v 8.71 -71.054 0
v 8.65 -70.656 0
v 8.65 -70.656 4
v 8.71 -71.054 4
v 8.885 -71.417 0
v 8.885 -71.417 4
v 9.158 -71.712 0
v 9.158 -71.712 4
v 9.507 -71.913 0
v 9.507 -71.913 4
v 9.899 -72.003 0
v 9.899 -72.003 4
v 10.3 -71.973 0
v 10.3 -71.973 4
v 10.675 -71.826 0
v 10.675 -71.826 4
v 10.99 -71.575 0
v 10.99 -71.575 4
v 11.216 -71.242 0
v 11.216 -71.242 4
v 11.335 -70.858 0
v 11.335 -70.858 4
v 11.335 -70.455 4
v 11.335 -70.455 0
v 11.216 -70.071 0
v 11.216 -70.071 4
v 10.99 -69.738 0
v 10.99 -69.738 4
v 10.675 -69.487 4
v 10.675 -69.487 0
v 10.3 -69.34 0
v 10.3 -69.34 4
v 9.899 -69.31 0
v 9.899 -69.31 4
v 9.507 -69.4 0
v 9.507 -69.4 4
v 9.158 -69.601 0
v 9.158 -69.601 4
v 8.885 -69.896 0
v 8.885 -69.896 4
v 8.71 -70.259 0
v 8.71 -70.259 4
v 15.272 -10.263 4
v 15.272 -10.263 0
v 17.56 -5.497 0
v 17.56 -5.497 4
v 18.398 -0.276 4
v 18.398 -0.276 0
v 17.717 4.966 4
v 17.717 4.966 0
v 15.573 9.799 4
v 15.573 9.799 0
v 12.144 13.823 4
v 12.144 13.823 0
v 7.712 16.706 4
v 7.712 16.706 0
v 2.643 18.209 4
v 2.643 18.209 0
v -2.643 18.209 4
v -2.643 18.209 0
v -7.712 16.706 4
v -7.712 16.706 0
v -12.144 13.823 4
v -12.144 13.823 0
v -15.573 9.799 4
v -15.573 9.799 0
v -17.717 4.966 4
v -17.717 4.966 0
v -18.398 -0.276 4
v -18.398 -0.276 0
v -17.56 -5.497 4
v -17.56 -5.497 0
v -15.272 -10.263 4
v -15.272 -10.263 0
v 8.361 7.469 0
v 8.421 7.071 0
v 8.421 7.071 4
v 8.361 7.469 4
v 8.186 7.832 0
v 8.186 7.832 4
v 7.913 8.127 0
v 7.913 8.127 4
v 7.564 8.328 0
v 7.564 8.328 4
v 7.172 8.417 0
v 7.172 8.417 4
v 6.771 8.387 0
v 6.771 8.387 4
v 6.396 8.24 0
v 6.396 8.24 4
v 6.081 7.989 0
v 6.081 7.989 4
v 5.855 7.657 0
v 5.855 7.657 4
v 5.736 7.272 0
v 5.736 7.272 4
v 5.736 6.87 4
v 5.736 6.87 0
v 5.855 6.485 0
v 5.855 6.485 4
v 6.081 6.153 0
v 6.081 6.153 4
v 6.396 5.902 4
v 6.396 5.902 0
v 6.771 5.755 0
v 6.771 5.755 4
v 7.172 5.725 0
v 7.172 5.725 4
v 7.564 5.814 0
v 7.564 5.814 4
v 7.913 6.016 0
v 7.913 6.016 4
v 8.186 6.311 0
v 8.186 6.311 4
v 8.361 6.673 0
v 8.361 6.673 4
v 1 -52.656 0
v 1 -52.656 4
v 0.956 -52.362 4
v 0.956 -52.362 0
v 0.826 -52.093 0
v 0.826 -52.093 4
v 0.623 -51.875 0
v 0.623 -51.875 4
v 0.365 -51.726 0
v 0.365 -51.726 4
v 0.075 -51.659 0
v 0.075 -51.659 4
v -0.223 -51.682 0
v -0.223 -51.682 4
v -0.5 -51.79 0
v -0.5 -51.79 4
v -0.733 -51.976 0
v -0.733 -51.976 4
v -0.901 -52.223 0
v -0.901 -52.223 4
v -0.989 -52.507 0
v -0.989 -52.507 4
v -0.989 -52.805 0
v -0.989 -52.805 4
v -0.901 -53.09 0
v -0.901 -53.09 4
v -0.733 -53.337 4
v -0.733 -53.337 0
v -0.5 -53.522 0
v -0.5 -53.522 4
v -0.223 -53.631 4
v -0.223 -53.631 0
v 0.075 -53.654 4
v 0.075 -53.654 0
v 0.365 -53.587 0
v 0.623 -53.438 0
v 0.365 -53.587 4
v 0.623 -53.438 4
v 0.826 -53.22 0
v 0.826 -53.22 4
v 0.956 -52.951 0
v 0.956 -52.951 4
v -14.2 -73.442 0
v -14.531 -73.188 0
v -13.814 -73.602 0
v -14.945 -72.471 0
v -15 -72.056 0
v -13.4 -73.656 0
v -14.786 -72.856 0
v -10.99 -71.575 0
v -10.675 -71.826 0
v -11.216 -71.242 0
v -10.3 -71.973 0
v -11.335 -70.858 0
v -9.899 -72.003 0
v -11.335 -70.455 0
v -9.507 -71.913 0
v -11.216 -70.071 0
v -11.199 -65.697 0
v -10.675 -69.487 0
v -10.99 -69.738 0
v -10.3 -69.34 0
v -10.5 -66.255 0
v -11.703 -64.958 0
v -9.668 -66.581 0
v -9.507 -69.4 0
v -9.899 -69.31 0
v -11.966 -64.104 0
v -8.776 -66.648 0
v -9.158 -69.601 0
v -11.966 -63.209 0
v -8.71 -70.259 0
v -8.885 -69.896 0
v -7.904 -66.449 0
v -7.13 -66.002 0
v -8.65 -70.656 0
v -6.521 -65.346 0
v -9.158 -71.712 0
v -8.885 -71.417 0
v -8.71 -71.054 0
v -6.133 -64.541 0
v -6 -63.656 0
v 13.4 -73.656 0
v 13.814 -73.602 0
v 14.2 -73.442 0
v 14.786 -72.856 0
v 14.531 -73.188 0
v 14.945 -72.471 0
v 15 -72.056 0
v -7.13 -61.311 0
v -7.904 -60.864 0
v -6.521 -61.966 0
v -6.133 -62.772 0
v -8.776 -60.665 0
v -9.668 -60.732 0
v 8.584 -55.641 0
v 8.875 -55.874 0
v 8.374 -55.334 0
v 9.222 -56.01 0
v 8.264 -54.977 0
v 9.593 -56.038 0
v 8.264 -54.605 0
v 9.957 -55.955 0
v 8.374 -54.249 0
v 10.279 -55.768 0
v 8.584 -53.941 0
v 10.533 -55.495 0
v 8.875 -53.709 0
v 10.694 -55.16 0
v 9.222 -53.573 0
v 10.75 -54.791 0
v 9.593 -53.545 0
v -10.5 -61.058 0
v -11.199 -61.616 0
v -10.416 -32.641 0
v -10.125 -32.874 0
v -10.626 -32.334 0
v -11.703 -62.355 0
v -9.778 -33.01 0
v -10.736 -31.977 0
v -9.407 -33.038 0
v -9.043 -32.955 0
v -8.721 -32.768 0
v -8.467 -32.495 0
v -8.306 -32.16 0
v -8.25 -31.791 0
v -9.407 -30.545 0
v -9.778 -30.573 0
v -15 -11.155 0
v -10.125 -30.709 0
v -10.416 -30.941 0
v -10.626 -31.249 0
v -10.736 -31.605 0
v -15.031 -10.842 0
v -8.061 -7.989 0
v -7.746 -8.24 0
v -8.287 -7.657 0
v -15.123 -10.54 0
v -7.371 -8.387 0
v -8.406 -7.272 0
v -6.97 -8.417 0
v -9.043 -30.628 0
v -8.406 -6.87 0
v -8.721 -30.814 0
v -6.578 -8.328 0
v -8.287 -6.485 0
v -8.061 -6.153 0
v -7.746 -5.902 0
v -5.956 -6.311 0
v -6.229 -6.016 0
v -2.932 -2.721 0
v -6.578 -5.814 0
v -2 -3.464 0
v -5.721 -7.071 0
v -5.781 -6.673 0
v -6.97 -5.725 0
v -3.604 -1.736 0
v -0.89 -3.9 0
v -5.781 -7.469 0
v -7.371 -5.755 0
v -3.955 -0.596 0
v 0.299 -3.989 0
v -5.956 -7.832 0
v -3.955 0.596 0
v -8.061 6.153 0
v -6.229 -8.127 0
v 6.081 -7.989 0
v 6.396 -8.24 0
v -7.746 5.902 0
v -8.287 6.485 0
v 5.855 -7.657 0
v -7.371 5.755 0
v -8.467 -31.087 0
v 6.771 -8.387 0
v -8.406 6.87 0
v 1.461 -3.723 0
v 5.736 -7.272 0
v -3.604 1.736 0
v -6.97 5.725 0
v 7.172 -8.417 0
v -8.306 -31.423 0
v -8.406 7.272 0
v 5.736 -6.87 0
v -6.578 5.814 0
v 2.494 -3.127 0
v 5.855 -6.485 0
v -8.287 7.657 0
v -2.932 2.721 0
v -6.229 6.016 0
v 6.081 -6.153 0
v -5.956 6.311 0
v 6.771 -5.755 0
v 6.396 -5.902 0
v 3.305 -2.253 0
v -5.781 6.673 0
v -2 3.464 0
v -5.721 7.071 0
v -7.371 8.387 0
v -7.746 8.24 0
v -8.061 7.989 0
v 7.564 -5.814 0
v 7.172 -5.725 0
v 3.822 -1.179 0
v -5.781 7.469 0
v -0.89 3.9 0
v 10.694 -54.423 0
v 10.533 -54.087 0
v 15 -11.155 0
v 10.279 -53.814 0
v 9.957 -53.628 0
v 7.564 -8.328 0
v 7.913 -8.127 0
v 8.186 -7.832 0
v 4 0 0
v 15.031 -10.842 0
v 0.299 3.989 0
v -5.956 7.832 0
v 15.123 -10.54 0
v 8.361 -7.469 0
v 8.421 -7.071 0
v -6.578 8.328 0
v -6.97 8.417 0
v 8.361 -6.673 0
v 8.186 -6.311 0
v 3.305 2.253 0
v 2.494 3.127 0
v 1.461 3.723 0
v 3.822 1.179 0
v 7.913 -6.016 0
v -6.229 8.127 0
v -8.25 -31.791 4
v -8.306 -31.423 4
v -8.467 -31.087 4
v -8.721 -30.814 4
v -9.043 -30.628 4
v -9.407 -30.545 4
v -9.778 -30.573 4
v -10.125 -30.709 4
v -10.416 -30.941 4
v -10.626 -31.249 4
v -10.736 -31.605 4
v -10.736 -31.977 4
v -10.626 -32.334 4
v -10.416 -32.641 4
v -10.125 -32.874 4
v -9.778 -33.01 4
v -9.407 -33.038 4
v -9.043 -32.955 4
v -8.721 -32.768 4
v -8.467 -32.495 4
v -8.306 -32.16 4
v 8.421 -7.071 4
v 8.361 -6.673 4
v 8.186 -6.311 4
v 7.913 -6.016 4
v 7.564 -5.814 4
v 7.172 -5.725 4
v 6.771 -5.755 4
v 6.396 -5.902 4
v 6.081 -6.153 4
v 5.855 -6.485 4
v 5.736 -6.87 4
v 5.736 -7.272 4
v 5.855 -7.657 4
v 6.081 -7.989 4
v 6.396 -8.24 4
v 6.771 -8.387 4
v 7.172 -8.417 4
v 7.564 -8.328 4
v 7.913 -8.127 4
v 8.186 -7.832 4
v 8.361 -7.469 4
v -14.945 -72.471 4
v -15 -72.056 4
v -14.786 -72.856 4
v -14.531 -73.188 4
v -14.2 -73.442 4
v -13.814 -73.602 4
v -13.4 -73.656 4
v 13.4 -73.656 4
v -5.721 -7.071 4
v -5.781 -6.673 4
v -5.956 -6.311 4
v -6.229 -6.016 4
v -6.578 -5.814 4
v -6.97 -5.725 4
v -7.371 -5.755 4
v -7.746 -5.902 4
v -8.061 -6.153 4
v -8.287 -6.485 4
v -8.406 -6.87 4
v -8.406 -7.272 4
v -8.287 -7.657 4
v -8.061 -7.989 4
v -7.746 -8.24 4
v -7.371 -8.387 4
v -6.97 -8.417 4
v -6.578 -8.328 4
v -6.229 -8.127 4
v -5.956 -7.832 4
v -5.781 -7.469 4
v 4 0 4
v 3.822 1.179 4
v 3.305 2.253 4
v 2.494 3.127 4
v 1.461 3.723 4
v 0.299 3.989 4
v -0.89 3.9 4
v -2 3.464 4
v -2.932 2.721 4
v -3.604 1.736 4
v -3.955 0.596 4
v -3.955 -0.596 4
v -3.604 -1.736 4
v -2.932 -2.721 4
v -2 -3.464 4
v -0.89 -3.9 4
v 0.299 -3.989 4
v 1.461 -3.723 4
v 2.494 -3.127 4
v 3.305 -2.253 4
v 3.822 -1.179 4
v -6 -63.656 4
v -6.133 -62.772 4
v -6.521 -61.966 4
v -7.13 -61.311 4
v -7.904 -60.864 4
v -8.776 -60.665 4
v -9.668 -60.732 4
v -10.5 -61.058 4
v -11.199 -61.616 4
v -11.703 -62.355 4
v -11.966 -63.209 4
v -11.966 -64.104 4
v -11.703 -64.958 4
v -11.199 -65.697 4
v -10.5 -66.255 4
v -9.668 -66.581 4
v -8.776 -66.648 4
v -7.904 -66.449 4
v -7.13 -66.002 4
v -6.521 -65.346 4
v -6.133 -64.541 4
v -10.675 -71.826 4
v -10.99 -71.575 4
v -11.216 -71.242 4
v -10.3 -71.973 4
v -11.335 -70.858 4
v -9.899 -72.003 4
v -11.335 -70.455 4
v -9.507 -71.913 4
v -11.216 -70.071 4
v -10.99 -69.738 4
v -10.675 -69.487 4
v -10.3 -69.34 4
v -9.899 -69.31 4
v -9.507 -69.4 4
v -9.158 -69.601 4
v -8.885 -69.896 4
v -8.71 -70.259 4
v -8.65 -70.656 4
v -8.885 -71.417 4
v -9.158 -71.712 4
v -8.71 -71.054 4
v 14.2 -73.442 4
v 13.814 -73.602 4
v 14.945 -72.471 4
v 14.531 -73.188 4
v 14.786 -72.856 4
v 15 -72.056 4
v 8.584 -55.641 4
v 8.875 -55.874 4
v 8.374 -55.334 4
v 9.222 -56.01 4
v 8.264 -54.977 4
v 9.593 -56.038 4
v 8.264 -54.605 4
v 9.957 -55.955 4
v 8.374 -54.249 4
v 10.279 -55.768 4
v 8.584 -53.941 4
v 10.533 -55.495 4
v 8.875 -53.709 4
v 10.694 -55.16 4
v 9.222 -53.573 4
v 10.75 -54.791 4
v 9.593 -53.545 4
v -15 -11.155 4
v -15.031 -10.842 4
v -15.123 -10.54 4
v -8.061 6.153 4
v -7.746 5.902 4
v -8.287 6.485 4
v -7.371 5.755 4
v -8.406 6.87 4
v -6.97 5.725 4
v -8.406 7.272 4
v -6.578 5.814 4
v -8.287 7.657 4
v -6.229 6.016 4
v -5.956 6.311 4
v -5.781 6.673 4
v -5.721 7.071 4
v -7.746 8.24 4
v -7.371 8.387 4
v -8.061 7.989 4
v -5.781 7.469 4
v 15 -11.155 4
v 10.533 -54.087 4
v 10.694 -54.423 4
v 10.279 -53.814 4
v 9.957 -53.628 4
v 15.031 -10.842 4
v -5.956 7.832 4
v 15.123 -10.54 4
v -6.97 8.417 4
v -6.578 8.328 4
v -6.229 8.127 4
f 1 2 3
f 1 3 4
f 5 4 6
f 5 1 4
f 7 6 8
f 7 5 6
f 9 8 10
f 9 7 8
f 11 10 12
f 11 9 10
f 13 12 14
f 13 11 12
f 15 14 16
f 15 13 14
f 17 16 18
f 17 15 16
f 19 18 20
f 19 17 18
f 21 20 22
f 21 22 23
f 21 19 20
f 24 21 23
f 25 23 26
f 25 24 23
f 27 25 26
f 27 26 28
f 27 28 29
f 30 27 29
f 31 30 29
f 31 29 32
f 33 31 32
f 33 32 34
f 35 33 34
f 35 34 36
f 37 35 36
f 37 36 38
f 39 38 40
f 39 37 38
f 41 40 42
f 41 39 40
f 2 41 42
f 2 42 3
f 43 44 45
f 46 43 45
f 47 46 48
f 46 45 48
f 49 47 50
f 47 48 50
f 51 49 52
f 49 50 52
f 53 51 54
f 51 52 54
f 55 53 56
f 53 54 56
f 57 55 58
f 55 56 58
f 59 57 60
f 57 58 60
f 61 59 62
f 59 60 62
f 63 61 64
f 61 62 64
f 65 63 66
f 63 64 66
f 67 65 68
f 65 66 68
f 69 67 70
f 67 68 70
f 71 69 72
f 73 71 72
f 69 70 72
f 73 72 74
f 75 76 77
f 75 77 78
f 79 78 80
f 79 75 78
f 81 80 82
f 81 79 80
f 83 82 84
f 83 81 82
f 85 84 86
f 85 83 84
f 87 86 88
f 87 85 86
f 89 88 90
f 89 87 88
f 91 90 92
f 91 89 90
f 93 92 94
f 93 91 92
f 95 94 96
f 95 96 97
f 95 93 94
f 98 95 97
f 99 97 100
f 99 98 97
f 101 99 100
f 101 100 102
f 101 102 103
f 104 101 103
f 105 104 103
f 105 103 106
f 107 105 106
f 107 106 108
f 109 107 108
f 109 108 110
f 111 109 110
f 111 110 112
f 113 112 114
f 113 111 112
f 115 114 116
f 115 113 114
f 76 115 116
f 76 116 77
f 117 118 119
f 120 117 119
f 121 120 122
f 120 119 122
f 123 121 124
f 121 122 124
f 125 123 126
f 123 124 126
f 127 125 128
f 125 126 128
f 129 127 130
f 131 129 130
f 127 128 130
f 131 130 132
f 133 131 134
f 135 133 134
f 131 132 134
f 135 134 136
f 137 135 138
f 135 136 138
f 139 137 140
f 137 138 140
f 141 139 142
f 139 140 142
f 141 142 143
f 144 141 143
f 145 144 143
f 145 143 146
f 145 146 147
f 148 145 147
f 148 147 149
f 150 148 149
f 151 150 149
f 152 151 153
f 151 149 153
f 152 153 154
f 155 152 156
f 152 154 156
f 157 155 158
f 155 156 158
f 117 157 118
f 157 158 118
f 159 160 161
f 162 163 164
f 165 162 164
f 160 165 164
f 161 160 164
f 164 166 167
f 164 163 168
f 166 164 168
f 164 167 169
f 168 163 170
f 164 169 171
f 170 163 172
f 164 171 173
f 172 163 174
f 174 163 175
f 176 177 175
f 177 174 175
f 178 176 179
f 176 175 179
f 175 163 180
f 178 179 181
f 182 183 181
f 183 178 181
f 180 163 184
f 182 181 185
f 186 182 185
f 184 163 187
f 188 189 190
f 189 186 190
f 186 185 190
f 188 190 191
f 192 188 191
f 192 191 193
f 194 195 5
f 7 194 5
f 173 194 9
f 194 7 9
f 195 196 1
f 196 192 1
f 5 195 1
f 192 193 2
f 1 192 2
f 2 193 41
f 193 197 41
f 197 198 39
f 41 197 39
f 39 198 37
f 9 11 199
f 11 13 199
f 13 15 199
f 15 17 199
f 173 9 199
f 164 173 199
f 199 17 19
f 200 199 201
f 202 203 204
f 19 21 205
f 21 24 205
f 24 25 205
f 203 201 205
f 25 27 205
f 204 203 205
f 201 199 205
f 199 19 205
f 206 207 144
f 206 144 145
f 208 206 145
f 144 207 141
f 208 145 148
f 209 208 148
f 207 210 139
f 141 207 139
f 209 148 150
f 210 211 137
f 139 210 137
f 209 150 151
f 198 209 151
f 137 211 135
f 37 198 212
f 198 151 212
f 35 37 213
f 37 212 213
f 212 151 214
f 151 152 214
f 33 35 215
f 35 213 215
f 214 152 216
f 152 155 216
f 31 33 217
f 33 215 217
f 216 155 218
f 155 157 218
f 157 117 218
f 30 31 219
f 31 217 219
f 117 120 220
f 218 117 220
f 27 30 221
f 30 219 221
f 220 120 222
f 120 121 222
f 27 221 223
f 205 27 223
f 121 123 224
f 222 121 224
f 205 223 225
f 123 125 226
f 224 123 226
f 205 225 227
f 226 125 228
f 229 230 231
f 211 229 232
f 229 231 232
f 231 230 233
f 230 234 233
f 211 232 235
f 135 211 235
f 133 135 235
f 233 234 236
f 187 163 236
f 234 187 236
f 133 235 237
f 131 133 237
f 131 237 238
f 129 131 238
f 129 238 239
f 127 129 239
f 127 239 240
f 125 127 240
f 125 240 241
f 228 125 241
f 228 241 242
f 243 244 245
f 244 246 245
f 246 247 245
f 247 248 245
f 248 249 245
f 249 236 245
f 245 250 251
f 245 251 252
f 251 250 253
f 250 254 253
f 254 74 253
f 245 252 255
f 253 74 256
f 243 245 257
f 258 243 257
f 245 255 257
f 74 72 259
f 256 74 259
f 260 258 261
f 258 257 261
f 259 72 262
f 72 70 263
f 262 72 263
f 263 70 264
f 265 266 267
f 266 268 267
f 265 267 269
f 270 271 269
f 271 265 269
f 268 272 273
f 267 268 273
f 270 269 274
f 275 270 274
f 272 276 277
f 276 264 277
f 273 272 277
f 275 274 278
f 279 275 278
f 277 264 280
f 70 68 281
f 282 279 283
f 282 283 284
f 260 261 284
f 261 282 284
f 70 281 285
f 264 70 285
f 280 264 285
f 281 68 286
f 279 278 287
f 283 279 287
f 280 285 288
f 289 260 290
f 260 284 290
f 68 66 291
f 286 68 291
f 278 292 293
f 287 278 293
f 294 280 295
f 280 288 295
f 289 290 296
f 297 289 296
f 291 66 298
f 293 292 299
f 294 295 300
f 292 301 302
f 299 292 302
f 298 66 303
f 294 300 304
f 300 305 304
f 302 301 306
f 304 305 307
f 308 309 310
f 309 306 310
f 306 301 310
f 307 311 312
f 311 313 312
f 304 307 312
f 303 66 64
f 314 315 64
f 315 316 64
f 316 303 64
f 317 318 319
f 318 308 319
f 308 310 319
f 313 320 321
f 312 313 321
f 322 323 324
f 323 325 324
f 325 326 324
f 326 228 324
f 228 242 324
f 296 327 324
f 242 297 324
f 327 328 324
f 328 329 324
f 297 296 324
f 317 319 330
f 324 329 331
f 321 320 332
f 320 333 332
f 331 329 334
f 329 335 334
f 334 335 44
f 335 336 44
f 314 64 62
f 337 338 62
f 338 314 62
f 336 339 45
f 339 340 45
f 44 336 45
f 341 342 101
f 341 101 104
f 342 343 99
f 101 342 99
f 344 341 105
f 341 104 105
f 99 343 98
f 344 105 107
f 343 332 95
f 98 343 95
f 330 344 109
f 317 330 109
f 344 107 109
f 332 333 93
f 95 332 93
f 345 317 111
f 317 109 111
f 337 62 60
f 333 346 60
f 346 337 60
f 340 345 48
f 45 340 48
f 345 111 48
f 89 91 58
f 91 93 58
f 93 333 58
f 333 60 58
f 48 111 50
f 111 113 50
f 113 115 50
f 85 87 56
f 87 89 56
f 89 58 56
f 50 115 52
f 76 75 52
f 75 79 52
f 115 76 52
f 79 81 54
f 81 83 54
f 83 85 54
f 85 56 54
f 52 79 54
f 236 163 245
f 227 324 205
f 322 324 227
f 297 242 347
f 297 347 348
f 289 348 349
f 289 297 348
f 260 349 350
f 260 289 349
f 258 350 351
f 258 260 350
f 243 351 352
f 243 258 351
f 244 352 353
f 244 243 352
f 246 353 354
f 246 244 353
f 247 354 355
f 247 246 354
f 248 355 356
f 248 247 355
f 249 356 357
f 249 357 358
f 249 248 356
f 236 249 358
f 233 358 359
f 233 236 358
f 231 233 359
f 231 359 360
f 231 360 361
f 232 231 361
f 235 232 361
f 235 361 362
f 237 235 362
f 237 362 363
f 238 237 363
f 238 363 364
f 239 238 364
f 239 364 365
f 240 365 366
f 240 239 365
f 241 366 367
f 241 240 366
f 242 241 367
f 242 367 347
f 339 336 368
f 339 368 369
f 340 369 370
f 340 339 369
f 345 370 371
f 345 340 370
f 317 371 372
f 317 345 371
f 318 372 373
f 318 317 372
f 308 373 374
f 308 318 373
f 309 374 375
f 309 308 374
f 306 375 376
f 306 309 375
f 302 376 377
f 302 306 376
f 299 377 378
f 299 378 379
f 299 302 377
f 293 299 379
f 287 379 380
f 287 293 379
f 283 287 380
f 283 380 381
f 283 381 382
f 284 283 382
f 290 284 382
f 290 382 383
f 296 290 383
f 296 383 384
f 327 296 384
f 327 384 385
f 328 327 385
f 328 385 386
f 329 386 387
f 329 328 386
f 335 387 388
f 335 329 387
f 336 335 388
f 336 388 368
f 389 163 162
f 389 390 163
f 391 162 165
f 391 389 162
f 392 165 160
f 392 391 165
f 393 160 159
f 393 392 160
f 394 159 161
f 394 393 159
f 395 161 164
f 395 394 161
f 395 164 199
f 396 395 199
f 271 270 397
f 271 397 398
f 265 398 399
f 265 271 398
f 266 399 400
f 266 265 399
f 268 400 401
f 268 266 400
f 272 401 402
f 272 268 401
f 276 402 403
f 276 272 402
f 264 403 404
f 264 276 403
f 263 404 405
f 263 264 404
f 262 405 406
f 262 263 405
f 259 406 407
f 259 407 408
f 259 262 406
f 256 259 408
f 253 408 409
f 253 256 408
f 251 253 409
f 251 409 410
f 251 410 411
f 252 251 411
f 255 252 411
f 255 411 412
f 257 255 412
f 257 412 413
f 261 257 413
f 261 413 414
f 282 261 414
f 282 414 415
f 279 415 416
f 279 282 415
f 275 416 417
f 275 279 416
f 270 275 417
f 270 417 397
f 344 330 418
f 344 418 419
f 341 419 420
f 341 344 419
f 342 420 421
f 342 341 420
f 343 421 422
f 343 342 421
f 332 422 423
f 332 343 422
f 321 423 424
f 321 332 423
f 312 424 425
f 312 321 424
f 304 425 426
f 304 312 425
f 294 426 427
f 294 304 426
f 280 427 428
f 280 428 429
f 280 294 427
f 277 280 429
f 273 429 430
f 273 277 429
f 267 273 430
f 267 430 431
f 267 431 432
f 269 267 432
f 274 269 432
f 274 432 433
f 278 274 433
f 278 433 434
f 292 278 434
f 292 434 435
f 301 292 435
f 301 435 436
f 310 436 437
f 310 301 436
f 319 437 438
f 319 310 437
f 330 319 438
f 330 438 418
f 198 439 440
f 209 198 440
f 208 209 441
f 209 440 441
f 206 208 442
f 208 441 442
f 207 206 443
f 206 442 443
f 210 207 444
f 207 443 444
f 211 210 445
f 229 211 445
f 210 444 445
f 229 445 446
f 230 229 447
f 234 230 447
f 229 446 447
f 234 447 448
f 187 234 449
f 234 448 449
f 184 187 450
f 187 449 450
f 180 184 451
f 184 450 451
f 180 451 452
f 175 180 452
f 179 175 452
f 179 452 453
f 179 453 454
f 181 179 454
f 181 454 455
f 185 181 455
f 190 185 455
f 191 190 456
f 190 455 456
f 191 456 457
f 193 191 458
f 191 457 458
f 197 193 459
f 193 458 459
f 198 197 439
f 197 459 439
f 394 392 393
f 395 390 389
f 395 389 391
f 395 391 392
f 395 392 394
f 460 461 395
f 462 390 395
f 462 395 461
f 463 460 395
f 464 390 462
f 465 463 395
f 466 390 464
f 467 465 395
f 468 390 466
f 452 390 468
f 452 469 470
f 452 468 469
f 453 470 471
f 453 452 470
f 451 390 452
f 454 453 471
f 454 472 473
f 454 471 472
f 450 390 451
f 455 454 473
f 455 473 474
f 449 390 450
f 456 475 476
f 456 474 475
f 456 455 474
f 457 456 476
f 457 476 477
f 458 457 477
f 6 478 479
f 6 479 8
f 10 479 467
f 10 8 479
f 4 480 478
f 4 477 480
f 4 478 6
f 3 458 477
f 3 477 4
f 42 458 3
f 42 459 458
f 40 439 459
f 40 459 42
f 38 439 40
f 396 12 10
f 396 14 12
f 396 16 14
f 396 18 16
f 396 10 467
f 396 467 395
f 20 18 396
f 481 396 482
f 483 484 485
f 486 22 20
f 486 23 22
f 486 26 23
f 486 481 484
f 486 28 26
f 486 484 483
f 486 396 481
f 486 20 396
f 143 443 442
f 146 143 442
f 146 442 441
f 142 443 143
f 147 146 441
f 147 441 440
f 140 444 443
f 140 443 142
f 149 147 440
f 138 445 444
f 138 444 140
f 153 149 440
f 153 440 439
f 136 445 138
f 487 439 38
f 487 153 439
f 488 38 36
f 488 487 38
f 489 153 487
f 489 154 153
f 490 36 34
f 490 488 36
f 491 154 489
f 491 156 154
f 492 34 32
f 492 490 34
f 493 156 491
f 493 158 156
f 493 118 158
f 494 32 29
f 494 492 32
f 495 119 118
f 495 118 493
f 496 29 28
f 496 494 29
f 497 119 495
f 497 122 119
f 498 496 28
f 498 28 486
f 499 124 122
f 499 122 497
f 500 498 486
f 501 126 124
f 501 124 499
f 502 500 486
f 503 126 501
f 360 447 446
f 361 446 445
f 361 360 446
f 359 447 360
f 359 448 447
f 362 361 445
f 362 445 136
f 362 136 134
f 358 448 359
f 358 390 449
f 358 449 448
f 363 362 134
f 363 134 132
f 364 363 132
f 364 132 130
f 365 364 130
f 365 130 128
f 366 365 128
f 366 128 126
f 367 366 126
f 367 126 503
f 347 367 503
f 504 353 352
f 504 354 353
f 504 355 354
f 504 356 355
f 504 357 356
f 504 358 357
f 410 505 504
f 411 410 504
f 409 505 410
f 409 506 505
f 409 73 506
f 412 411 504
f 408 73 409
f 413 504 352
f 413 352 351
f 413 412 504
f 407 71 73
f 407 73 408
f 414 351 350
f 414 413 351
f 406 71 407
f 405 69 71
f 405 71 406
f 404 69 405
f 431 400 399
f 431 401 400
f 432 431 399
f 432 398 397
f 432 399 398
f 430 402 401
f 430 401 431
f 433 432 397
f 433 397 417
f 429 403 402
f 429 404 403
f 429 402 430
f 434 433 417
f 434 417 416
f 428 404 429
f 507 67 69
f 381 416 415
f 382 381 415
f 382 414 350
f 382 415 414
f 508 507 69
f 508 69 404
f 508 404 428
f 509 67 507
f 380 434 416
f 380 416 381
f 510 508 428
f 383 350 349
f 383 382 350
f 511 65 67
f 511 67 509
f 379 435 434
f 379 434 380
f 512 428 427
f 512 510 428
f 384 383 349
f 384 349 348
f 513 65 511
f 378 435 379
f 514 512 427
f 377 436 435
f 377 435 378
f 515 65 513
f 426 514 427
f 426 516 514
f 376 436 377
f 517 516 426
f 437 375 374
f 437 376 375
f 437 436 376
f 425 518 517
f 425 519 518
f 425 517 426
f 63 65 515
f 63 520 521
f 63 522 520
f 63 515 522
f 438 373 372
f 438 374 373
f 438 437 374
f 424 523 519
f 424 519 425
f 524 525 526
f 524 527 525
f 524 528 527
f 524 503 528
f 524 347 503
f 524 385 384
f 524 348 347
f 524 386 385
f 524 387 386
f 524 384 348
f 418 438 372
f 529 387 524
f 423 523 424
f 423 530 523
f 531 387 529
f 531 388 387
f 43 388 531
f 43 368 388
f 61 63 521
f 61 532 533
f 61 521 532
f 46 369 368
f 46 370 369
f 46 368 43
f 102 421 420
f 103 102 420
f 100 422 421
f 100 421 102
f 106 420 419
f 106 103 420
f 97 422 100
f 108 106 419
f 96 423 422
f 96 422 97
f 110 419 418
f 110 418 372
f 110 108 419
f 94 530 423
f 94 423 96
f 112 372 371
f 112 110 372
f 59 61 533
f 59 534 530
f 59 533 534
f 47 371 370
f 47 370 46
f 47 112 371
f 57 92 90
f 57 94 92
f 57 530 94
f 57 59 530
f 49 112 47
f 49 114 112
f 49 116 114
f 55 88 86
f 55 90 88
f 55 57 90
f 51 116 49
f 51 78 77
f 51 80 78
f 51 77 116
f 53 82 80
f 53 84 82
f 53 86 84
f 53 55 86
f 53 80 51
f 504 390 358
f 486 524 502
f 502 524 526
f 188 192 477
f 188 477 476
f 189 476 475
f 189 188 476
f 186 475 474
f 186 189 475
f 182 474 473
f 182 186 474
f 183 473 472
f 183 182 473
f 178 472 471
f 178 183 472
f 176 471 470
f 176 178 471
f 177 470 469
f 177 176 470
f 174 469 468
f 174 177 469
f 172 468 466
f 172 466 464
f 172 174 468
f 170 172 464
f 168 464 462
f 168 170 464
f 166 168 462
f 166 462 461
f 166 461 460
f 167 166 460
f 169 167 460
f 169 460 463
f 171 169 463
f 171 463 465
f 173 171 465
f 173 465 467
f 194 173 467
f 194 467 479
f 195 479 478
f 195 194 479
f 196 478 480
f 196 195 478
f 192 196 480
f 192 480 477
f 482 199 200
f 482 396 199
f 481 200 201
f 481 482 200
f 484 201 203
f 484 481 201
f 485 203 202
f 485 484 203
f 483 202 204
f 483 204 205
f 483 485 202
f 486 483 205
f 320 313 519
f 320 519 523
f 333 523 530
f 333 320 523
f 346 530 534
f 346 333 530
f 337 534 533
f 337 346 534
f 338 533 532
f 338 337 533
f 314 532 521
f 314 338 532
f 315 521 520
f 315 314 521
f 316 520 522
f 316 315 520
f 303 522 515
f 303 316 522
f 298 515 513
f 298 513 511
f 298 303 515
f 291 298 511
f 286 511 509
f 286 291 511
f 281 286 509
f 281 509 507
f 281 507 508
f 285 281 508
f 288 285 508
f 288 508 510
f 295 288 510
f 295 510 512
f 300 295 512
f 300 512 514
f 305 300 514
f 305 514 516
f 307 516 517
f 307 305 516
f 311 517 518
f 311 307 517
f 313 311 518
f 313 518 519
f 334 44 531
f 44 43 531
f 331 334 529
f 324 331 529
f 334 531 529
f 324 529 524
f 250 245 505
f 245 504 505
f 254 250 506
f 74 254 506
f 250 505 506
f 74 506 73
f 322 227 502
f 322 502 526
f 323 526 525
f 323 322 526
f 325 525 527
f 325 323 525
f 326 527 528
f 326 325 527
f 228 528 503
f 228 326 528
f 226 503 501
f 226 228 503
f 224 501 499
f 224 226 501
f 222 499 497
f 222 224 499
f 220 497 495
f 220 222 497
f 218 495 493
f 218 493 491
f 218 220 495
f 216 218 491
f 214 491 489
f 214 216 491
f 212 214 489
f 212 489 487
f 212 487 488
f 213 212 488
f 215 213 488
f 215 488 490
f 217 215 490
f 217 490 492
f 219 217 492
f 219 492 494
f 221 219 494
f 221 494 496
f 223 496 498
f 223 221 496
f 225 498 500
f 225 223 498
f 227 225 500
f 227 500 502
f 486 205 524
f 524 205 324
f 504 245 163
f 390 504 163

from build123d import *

# Parameters (mm, degrees)
CROQUIS1_R              = 1.35
CROQUIS1_R_2            = 4
CROQUIS1_R_3            = 1.25
SALIENTE_EXTRUIR1_DEPTH = 4
REDONDEO1_R             = 1.6
CROQUIS2_R              = 1
CROQUIS2_R_2            = 3
CORTAR_EXTRUIR1_DEPTH   = 4


with BuildPart() as part:
    # Croquis1 → Saliente-Extruir1 (new body)
    with BuildSketch(Plane.XY):
        with BuildLine():
            Line((-15, -10.656453444), (-15, -73.656453444))
            Line((-15, -73.656453444), (15, -73.656453444))
            Line((15, -73.656453444), (15, -10.656453444))
            ThreePointArc((15, -10.656453444), (0, 18.4), (-15, -10.656453444))
        make_face()
        with Locations((-7.071067812, -7.071067812)):
            Circle(CROQUIS1_R, mode=Mode.SUBTRACT)
        with Locations((-7.071067812, 7.071067812)):
            Circle(CROQUIS1_R, mode=Mode.SUBTRACT)
        with Locations((7.071067812, 7.071067812)):
            Circle(CROQUIS1_R, mode=Mode.SUBTRACT)
        with Locations((7.071067812, -7.071067812)):
            Circle(CROQUIS1_R, mode=Mode.SUBTRACT)
        Circle(CROQUIS1_R_2, mode=Mode.SUBTRACT)
        with Locations((-10, -70.656453444)):
            Circle(CROQUIS1_R, mode=Mode.SUBTRACT)
        with Locations(Location((10, -70.656453444, 0), (0, 0, 180))):
            Circle(CROQUIS1_R, mode=Mode.SUBTRACT)
        with Locations((9.5, -54.791192074)):
            Circle(CROQUIS1_R_3, mode=Mode.SUBTRACT)
        with Locations((-9.5, -31.791192074)):
            Circle(CROQUIS1_R_3, mode=Mode.SUBTRACT)
    extrude(amount=SALIENTE_EXTRUIR1_DEPTH)

    # Redondeo1
    redondeo1_edges = [part.edges().sort_by_distance(p)[0] for p in [
        (15, -10.656453444, 2),
        (15, -73.656453444, 2),
        (-15, -73.656453444, 2),
        (-15, -10.656453444, 2),
    ]]
    fillet(redondeo1_edges, radius=REDONDEO1_R)

    # Croquis2 → Cortar-Extruir1 (cut)
    with BuildSketch(Plane.XY.offset(4)):
        with Locations((0, -52.656453444)):
            Circle(CROQUIS2_R)
        with Locations((-9, -63.656453444)):
            Circle(CROQUIS2_R_2)
    extrude(amount=-CORTAR_EXTRUIR1_DEPTH, mode=Mode.SUBTRACT)


solid = part.part
